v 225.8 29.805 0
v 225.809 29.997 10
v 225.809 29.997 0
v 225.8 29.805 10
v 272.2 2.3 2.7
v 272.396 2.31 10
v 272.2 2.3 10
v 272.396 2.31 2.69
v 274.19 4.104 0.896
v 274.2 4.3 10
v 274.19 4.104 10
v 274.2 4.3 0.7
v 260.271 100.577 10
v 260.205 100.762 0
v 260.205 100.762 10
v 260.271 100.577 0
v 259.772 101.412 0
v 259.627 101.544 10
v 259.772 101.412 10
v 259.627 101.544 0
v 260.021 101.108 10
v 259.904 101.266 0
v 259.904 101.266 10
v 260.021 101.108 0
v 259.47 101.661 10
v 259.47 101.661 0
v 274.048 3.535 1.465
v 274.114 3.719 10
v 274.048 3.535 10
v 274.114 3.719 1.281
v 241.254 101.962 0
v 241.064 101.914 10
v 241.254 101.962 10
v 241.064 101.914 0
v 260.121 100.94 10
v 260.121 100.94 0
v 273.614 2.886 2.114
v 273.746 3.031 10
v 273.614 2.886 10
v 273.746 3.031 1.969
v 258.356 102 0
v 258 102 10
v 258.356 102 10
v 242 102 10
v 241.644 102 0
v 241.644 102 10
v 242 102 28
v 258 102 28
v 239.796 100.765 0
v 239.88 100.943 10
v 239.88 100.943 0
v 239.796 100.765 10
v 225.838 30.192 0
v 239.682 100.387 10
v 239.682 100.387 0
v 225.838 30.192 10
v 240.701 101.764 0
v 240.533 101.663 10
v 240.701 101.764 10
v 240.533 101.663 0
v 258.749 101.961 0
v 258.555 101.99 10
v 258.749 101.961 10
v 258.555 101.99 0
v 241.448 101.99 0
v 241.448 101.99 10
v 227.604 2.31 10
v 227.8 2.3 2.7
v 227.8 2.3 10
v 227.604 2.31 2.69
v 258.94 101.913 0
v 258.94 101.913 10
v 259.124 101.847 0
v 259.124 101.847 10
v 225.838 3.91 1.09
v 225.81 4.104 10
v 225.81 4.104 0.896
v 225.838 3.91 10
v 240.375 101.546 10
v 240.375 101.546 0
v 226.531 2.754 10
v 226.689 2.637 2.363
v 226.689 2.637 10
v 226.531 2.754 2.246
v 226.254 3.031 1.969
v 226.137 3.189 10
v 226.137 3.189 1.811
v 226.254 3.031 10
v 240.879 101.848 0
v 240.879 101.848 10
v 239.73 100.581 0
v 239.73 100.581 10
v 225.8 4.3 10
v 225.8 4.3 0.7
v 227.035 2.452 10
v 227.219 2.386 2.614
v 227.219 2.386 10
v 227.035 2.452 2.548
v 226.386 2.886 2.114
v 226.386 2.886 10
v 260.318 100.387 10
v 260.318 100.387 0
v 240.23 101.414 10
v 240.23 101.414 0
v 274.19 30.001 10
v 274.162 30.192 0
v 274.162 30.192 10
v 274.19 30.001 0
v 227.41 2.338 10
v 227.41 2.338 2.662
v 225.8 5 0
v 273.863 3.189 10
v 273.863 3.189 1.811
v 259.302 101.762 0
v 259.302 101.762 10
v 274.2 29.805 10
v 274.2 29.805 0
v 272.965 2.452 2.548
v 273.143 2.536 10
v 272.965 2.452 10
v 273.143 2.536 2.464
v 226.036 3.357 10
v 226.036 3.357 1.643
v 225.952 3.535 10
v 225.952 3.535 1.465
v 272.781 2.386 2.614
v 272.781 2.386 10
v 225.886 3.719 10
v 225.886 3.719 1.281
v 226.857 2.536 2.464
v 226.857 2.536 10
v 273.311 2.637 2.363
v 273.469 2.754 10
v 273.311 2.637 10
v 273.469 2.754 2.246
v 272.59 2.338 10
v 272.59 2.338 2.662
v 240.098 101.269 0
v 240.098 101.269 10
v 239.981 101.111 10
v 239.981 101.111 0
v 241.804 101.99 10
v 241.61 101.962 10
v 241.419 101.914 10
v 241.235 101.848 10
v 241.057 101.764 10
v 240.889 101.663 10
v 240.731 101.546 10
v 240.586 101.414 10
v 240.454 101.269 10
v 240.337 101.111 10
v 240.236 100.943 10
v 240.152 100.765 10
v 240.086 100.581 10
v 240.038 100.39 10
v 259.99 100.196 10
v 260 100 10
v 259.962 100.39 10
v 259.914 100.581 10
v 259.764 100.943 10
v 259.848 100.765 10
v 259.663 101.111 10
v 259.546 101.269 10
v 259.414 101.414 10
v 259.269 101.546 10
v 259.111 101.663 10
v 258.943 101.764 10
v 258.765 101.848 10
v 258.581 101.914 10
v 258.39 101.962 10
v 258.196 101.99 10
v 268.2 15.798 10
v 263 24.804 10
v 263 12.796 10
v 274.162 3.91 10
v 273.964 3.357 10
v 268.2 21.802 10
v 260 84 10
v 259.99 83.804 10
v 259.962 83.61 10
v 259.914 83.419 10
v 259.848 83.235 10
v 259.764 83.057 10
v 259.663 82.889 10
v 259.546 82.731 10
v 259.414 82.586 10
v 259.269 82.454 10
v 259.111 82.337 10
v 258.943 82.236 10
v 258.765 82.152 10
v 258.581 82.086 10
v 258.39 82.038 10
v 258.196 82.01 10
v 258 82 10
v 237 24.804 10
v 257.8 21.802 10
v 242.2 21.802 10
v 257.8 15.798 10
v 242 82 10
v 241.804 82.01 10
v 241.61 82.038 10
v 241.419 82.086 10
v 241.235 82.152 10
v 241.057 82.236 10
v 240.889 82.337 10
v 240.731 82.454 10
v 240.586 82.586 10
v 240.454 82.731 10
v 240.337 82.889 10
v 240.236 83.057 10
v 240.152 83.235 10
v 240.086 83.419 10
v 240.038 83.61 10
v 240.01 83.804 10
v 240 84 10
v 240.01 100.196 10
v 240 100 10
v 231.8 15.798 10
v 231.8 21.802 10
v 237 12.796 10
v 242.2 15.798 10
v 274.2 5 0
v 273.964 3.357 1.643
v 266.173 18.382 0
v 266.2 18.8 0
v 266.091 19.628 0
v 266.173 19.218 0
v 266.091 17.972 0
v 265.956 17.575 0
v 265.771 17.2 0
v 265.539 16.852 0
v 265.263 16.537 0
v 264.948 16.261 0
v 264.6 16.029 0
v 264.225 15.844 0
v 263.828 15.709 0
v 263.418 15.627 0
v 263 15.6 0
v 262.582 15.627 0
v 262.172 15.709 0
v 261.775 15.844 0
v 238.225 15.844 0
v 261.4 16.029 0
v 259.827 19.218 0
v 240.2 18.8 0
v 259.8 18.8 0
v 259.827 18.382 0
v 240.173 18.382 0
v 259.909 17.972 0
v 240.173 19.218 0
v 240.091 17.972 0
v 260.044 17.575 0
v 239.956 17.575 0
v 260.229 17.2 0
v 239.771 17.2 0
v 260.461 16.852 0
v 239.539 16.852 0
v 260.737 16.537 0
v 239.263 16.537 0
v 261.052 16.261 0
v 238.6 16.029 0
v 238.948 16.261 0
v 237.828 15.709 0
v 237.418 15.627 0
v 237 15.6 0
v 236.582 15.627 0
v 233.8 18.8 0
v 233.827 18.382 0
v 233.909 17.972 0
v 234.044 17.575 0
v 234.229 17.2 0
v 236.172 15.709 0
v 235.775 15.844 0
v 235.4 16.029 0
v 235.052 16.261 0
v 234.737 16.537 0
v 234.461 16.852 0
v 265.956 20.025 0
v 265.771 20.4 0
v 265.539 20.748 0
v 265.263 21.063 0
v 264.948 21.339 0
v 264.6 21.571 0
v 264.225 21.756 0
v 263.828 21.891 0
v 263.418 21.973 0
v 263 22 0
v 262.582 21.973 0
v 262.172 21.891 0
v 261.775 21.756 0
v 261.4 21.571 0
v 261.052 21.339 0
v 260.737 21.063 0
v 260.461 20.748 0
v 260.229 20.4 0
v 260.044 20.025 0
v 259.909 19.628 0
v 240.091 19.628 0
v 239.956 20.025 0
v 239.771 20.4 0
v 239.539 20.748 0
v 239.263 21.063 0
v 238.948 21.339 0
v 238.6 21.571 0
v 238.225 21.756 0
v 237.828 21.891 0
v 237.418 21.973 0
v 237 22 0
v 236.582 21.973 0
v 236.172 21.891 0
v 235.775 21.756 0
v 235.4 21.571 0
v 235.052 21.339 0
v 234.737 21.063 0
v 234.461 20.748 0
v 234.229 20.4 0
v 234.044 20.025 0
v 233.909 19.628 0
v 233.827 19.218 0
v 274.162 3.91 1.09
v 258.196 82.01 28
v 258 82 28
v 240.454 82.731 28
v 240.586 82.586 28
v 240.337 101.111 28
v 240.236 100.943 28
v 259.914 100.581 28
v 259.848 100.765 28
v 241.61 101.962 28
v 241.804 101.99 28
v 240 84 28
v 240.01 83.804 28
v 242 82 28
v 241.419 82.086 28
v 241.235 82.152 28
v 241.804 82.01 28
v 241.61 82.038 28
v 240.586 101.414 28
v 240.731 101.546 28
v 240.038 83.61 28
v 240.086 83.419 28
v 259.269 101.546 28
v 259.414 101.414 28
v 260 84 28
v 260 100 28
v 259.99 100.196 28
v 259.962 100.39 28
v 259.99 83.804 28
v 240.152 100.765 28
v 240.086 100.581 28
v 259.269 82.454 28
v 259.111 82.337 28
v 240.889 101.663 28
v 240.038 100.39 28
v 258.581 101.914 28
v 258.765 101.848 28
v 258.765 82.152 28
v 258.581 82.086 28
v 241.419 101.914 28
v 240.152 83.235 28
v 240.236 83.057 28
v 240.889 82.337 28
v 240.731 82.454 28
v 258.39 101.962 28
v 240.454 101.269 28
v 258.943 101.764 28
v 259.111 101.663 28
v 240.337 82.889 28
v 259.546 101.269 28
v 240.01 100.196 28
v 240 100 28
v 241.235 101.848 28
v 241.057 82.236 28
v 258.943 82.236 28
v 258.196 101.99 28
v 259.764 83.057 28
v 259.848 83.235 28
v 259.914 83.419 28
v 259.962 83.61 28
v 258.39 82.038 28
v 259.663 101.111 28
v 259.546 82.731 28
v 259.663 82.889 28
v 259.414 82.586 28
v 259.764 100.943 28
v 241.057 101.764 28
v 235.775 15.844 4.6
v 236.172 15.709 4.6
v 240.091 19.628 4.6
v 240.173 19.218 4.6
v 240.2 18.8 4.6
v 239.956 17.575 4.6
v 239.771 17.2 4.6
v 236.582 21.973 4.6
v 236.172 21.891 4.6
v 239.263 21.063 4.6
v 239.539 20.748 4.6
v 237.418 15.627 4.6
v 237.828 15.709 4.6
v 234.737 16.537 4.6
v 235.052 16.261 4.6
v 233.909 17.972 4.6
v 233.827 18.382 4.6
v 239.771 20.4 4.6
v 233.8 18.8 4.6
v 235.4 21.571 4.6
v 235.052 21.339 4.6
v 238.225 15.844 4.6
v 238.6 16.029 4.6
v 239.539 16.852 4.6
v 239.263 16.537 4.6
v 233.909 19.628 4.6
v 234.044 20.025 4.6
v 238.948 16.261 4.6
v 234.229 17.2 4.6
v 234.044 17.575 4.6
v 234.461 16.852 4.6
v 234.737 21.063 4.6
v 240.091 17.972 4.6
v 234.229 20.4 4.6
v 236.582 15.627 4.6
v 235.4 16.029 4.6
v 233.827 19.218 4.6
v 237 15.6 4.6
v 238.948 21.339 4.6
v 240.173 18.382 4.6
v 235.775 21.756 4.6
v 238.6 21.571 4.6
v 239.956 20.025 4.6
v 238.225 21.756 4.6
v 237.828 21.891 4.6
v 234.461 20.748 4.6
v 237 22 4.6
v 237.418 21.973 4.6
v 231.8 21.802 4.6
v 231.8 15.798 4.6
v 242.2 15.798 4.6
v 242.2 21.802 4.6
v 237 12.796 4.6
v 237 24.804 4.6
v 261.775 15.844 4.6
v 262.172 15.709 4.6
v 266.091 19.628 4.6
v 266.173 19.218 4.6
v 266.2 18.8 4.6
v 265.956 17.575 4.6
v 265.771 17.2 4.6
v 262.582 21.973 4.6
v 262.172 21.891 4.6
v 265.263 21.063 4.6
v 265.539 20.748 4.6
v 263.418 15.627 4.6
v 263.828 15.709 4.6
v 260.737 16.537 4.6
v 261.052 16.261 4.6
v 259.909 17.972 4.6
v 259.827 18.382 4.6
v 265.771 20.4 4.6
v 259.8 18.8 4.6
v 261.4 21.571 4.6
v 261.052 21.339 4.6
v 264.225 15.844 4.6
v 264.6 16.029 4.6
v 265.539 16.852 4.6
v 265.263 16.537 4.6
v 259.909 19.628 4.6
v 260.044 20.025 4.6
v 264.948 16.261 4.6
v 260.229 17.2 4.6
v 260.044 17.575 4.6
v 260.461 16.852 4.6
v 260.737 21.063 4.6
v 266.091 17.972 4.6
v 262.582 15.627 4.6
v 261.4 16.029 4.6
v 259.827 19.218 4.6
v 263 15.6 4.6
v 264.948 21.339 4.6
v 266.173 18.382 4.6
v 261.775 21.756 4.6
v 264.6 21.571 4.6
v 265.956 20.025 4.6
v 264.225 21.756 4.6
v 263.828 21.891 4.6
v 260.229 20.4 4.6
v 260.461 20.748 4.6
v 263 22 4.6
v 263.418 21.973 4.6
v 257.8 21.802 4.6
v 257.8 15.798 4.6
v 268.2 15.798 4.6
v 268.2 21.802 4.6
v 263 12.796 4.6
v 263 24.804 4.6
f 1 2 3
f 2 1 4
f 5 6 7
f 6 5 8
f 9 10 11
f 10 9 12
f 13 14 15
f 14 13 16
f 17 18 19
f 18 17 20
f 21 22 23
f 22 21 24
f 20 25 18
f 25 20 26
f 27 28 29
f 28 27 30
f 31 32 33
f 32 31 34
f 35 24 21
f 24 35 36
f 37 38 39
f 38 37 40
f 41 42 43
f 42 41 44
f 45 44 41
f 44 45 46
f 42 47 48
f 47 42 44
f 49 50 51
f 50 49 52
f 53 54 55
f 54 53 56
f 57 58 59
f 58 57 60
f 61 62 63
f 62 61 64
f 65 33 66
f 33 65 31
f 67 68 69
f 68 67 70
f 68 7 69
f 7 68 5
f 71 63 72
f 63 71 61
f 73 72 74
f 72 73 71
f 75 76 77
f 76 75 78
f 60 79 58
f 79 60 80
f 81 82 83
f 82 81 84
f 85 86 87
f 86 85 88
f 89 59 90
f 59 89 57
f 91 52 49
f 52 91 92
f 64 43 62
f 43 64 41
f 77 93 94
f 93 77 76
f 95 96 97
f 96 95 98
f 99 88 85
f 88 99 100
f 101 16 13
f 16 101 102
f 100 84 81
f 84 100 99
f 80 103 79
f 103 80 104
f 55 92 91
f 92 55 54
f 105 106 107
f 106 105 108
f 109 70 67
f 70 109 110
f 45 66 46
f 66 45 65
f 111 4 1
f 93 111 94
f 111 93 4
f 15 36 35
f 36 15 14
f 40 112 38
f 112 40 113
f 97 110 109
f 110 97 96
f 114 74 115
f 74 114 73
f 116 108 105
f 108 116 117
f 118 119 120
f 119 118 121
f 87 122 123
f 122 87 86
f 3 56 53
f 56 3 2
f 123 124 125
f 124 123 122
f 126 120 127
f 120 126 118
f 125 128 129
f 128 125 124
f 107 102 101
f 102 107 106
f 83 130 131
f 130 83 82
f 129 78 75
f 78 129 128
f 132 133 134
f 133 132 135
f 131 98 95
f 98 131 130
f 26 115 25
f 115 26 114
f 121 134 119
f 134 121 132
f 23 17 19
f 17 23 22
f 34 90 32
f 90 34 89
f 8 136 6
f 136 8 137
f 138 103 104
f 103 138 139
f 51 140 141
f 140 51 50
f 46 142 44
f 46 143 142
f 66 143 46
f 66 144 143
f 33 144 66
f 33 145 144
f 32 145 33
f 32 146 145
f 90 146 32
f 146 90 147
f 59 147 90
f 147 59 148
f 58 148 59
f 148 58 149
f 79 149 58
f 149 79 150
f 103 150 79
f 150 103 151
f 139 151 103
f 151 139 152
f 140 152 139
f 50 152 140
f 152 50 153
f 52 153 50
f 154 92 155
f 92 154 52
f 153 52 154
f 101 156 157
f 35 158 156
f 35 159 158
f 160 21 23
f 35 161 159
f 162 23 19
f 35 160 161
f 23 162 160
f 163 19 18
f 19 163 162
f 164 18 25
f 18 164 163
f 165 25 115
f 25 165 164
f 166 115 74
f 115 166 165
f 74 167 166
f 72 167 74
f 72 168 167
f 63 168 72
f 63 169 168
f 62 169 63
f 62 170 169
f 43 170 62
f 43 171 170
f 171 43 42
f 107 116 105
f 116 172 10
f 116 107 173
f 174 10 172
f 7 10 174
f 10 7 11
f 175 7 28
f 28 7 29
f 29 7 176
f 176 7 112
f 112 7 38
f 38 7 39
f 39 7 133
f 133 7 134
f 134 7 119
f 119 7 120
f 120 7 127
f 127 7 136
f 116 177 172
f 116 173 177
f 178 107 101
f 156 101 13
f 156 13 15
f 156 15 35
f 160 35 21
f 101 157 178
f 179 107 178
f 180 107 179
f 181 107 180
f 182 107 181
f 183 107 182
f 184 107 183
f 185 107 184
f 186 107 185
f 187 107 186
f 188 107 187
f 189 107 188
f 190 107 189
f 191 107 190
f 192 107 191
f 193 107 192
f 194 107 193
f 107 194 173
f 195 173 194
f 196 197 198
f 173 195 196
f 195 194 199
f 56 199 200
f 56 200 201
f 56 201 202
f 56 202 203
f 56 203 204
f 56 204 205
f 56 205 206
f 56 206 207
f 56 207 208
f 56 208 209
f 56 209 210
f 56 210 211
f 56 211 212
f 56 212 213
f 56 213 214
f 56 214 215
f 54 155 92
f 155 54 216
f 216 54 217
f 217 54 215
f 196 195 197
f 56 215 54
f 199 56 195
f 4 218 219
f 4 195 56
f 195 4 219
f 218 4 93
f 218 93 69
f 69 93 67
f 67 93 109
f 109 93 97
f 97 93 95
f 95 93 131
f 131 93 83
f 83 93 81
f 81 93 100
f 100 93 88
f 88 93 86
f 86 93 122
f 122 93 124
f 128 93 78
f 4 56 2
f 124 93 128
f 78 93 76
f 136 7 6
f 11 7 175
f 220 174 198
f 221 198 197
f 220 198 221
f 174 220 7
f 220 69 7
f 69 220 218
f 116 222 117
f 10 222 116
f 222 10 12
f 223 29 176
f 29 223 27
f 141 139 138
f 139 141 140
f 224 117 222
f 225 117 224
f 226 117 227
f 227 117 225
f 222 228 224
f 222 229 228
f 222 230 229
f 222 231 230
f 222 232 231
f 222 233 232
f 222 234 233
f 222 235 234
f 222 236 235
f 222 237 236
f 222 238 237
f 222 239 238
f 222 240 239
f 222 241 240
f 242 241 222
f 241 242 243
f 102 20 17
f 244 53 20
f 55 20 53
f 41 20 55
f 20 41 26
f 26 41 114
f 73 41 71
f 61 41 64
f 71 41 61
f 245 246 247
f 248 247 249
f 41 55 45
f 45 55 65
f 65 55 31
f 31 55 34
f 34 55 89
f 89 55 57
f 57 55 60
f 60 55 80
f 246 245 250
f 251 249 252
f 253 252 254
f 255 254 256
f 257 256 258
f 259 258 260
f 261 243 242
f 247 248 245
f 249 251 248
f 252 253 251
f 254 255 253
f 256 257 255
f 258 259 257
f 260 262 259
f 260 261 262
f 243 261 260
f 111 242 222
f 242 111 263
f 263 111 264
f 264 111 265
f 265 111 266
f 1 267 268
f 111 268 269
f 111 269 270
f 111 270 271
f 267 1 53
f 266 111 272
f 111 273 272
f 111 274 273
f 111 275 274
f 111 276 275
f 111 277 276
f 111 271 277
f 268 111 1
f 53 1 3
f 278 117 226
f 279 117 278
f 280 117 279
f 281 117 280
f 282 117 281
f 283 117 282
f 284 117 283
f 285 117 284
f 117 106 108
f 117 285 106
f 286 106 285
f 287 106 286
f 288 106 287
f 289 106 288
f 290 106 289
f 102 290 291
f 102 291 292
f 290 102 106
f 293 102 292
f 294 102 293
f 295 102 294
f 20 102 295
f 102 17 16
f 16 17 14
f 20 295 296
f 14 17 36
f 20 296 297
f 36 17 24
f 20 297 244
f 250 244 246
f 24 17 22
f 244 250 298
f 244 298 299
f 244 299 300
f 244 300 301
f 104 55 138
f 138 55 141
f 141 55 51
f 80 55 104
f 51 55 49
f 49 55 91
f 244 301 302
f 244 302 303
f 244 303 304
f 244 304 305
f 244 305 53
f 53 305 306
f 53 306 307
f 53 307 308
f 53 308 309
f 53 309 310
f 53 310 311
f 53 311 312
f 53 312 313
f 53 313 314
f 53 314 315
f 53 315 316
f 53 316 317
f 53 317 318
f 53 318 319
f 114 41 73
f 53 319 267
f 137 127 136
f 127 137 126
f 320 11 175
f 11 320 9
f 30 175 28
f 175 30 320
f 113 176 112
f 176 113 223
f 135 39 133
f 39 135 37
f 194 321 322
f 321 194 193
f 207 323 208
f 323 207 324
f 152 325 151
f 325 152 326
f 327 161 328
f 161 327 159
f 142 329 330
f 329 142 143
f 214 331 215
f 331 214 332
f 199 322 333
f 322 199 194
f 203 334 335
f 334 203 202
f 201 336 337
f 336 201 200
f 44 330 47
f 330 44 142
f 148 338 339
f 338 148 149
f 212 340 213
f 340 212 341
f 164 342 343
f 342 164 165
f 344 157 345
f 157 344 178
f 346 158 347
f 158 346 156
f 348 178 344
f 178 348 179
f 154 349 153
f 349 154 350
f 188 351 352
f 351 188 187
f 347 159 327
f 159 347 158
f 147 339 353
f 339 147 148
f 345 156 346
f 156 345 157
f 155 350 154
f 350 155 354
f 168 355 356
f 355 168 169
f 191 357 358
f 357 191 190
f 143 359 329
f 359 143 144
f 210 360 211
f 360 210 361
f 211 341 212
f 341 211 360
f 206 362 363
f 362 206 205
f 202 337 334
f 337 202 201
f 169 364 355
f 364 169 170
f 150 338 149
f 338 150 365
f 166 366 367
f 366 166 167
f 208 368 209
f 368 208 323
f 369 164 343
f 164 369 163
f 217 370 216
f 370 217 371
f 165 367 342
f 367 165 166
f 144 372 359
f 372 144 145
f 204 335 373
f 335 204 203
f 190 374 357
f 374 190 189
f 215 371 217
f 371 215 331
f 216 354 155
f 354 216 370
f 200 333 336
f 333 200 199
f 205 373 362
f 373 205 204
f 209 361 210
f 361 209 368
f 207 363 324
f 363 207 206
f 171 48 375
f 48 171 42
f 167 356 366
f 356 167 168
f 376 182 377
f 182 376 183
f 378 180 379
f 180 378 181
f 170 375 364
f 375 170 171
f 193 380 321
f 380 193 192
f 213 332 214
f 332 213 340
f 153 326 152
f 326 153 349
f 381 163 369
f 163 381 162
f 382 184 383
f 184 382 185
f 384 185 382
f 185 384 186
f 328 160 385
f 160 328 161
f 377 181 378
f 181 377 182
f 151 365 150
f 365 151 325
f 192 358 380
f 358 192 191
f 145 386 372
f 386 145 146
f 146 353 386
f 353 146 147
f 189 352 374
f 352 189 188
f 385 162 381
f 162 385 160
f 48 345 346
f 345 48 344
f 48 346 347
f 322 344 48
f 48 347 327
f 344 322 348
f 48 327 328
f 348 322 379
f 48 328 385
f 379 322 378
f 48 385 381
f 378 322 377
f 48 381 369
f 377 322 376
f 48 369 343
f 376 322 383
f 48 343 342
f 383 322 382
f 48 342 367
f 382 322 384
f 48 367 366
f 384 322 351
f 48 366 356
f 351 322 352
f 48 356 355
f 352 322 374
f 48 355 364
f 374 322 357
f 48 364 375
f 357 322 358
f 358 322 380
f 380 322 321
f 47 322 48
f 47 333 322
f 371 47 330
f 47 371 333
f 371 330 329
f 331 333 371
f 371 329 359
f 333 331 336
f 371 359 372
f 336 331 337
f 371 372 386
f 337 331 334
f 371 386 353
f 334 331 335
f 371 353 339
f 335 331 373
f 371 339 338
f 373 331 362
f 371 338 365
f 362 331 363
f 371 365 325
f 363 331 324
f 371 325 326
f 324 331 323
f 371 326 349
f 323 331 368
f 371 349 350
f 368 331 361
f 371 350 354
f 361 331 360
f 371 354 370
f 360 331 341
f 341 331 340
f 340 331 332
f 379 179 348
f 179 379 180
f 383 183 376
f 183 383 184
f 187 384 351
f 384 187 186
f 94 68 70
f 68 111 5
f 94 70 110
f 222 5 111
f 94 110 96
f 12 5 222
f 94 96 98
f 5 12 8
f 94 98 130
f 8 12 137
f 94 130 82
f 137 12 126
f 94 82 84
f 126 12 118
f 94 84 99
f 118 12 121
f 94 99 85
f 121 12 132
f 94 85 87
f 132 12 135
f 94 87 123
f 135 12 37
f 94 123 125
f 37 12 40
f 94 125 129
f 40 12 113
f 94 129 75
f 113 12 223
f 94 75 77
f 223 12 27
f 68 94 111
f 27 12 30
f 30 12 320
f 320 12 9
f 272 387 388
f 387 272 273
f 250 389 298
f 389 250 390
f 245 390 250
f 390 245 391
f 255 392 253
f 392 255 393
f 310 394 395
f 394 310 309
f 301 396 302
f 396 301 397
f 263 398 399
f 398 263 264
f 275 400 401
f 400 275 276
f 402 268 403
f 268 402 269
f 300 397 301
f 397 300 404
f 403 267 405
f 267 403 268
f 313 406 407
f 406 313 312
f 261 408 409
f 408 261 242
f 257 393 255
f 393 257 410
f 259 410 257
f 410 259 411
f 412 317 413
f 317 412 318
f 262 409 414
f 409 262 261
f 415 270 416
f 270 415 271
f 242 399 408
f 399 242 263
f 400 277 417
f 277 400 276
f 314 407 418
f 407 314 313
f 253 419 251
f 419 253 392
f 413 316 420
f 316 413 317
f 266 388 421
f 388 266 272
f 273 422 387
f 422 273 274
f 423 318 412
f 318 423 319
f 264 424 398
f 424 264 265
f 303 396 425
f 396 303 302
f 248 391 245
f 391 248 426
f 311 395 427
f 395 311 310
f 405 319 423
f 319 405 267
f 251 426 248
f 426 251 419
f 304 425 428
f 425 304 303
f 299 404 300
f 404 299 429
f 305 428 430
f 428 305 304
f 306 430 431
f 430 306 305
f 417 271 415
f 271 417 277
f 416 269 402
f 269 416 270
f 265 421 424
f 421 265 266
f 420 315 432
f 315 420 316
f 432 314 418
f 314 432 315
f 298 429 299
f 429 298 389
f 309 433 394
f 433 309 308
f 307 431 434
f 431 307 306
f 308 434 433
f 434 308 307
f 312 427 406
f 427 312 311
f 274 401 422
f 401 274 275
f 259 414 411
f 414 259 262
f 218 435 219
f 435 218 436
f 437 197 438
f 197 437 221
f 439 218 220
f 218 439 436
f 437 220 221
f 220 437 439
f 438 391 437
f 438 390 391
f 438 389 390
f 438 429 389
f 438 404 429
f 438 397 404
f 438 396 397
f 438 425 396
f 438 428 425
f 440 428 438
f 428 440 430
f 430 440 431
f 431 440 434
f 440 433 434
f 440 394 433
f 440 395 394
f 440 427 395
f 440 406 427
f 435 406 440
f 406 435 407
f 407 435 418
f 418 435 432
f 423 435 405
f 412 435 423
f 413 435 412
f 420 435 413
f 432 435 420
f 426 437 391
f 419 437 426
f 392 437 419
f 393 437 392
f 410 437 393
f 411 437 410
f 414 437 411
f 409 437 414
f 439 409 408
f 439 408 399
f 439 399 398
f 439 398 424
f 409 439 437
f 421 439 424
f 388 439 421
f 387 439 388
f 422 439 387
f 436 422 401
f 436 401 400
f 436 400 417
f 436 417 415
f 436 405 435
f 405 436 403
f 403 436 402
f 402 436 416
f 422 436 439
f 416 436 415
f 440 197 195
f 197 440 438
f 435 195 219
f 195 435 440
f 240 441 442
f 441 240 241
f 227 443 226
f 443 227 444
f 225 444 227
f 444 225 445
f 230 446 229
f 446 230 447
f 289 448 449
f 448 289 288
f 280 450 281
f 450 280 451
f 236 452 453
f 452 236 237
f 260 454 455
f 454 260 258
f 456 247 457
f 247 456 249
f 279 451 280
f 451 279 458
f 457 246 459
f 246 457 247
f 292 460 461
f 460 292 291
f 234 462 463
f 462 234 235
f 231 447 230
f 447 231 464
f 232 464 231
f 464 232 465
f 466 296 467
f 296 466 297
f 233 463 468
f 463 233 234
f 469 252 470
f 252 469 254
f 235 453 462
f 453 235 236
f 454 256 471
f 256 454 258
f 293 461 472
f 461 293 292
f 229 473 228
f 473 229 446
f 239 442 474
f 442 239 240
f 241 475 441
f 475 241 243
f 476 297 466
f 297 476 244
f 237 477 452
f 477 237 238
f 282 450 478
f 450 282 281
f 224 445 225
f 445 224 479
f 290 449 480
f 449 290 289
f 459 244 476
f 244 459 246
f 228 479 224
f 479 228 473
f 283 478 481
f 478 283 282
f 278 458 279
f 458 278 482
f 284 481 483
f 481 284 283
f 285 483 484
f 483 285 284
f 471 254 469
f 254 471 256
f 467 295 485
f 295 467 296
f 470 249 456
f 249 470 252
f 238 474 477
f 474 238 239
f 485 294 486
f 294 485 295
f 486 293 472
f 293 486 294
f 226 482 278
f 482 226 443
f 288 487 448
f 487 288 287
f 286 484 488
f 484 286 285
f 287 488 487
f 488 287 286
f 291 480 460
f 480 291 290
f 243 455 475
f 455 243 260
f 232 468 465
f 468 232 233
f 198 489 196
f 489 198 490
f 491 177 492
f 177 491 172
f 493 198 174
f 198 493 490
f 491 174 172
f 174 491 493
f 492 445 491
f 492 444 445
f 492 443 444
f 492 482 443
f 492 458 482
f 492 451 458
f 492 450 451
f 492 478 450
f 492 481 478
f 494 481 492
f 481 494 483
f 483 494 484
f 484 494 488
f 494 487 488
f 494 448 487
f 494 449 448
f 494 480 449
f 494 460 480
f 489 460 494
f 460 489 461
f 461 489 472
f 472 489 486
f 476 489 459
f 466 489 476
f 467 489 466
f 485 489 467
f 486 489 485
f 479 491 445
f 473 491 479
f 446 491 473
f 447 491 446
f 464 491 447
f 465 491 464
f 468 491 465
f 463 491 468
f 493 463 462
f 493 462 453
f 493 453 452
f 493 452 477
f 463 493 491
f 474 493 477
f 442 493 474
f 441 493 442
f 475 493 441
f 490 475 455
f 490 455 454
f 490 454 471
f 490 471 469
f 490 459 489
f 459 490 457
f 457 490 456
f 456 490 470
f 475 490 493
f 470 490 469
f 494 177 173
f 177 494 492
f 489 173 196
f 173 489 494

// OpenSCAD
// file: ../../../../modules/steel_rack.scad
use <bolts.scad>;

bolt_edge_offset = 15;
bolt_positions = [
  bolt_edge_offset,
  bolt_edge_offset + 98,
  bolt_edge_offset + 98 + 24,
];

module bolt_and_nut(y, h) {
  nut_thickness = 5;
  translate([0, y, h / 2])
    m6_bolt_hole(h + 1, center = true);
  translate([0, y, h - nut_thickness / 2])
    rotate([0, 0, 90])
    m6_nut_trap(nut_thickness, center = true);
}

module long_bar(w, y, h) {
  difference() {
    translate([w / 2, y / 2, h / 2])
      cube([w, y, h], center = true);

    for (x = bolt_positions) {
      translate([x, 0, 0])
        bolt_and_nut(y / 2, h);
    }
  }
}

module short_bar(w, y, h) {
  difference() {
    translate([w / 2, y / 2, h / 2])
      cube([w, y, h], center = true);

    translate([bolt_positions[0], 0, 0])
      bolt_and_nut(y / 2, h);
  }
}

module fillet_profile(r, h) {
  linear_extrude(height = h, center = true)
    difference() {
      square([r, r]);
      circle(r = r, $fn = 64);
    }
}
// file: ../../../../modules/slide_rail_outer_bracket.scad
use <bolts.scad>
use <steel_rack.scad>

// スライドレール外側とL字アングルを接合するL字ブラケット。
// 設計の経緯と確定値は ledger/designs/steel-rack-500x400.md が正本。
//
// 座標系 (部品自身の datum):
//   X = 0 がこの部品側のL字アングル外側面。部品はアングル板厚の内側から始まる
//   Y = 0 がスライドレール外側面。+Y がラック外側
//   Z = 0 が部品底面 (レール下端と一致)
// front は screw_x = [37, 101.5]、rear は [79.5, 176] を自分の datum
// から渡す。 M6 が高さ 22.5±12 の対称配置のため部品は Z 反転対称になり、
// 左右のレールにも上下反転するだけで同じ2部品を使い回せる。

bracket_height = 45;
flange_t = 10; // 短辺 (X方向厚) の厚さ
// 長辺 (Y方向厚) の厚さ。旧断面は flange_t=10 を共用していたが、レール面を
// rail_offset 分外へ出すと M6 ナット挿入口が長辺と重なるため 2mm 削った
// (10→8、user決定)。ナット六角の内縁 (y=8.000) と長辺外面がツライチになる
arm_t = 8;
// レール接触面のラック外側オフセット。組付け実測でレール間隔が 385mm しか
// なくケース 412mm が入らないため、(412 - 385) / 2 + 0.5 = 14mm ずつ
// 各レールを外側へ移す (user指示)。M6 実穴は既に開いており位置を変えられない
rail_offset = 14;
inner_r = 4;
m6_z = [ 10.5, 34.5 ];
// クリアランス基準: 呼び寸法 + 0.4mm (実プリントの嵌合結果から拡大)
m6_pass_flat = 6.4; // M6ボルト通し六角の二面幅 (手前5mm)
m6_nut_flat = 10.4; // M6ナット窪み六角の二面幅 (奥5mm、ナット実測9.8 + 実効0.6)
m6_stage_depth = 5;
screw_z = 22.5;
m4_pass_flat = 4.4; // M4小トラスネジ通し六角の二面幅
m4_nut_flat = 7.4; // M4ナット窪み六角の二面幅 (ナット実測6.8 + 実効0.6)
m4_nut_depth = 2.8; // M4ナット窪みの深さ (user指定)
edge_margin = 8; // 穴の外縁から部品端までの余白 (自由な辺のみ)
angle_t = 2.2; // L字アングルの板厚

// 六角プリズム: 軸X・上下の辺が水平 (flat-up)。
// 天井を短い水平ブリッジにして垂れの改善を狙う
// (point-up だと天井面が水平から30°になり垂れた — 嵌合試験で確認済み)
module
hex_x_flat_up(flat_d, l)
{
    rotate([ 0, 90, 0 ]) rotate([ 0, 0, 90 ]) hex_hole(flat_d = flat_d, h = l);
}

// 六角プリズム: 軸Y・上下の辺が水平 (flat-up)。M6と同じくブリッジ天井
module
hex_y_flat_up(flat_d, l)
{
    rotate([ 90, 0, 0 ]) hex_hole(flat_d = flat_d, h = l);
}

module
slide_rail_outer_bracket(screw_x, name = "bracket")
{
    // flat-up配置では水平方向の穴半径は対角/2 (= 二面幅/(2*cos30))。
    // 8mm余白の契約はこの実半径に対して守る
    m6_nut_diag = m6_nut_flat / cos(30);
    m4_nut_diag = m4_nut_flat / cos(30);
    // M6中心: 実物のアングルには旧断面 (長辺厚10) の導出値
    // (厚10 + 内側R + 余白 + M6六角対角/2 = 28.0044) で既に穴が開いている。
    // 旧導出式から rail_offset を引くことで M6 実穴と部品外端の絶対位置を
    // 保ったまま、レール接触面 (y=0) だけをラック外側へ 14mm 出す
    m6_y = flange_t + inner_r + edge_margin + m6_nut_diag / 2 - rail_offset;
    short_len = m6_y + m6_nut_diag / 2 + edge_margin;
    // 長辺のX終端: 最奥のM4穴の最大断面 (ナット窪みの対角の半分) + 余白
    arm_end = max(screw_x) + m4_nut_diag / 2 + edge_margin;

    echo(str("CONTRACT ", name, ": height = ", bracket_height));
    echo(str("CONTRACT ", name, ": flange_t = ", flange_t));
    echo(str("CONTRACT ", name, ": arm_t = ", arm_t));
    echo(str("CONTRACT ", name, ": rail_offset = ", rail_offset));
    echo(str("CONTRACT ", name, ": inner_r = ", inner_r));
    echo(str("CONTRACT ", name, ": m6_z = ", m6_z));
    echo(str("CONTRACT ", name, ": m6_pass_flat = ", m6_pass_flat));
    echo(str("CONTRACT ", name, ": m6_nut_flat = ", m6_nut_flat));
    echo(str("CONTRACT ", name, ": screw_z = ", screw_z));
    echo(str("CONTRACT ", name, ": m4_pass_flat = ", m4_pass_flat));
    echo(str("CONTRACT ", name, ": m4_nut_flat = ", m4_nut_flat));
    echo(str("CONTRACT ", name, ": m4_nut_depth = ", m4_nut_depth));
    echo(str("CONTRACT ", name, ": edge_margin = ", edge_margin));
    echo(str("CONTRACT ", name, ": angle_t = ", angle_t));
    echo(str("CONTRACT ", name, ": screw_x = ", screw_x));
    echo(str("CONTRACT ",
             name,
             ": m6_y = ",
             m6_y,
             ", short_len = ",
             short_len,
             ", arm_end = ",
             arm_end));

    // 余白の契約 (自由な辺のみ。高さ45とM6のZはuser固定値なので対象外)。
    // M6ナット六角の内縁 (m6_y - 対角/2 = 8.000) は長辺外面 (y = arm_t) と
    // ツライチで、ナット挿入口が長辺に塞がれない (1e-9 は浮動小数の丸め猶予)
    assert(m6_y - m6_nut_diag / 2 >= arm_t - 1e-9,
           "M6 nut slot is blocked by the arm");
    assert(short_len - (m6_y + m6_nut_diag / 2) >= edge_margin,
           "M6 hole too close to the short-flange edge");
    assert(arm_end - (max(screw_x) + m4_nut_diag / 2) >= edge_margin,
           "M4 hole too close to the arm end");
    assert(min(screw_x) - m4_nut_diag / 2 >= angle_t + flange_t,
           "M4 hole overlaps the short flange");

    difference()
    {
        union()
        {
            // 短辺: アングル内側に当たる縦板 (M6で締結)
            translate([ angle_t, 0, 0 ])
                cube([ flange_t, short_len, bracket_height ]);

            // 長辺: レール外側面に当たる横板 (M4小トラスネジ+ナットで締結)
            translate([ angle_t, 0, 0 ])
                cube([ arm_end - angle_t, arm_t, bracket_height ]);

            // 内側コーナーのR4フィレット (応力集中の回避)
            translate([
                angle_t + flange_t + inner_r,
                arm_t + inner_r,
                bracket_height / 2
            ]) rotate([ 0, 0, 180 ]) fillet_profile(inner_r, bracket_height);
        }

        // M6の2段六角穴 (軸X・flat-up): 手前5mmが通し、奥5mmがナット窪み。
        // ナット窪みは +X へ延長した挿入回廊 (x=7.2..17): 短辺の背面から
        // fillet の掛かる区間を局所カットし、fillet 外端 (x=16.2) を 0.8mm
        // 超えて開放することで M6 ナットを +X 側から真っ直ぐ挿入できる
        // (fillet と挿入経路の干渉分を削るのは user 許容)。
        // 六角の下頂点 (y=8.000) は長辺外面とツライチで、正確な接触は
        // 退化した稜 (非多様体STL) を作るため、hull で 0.2mm 下へ掃引して
        // 長辺外面に浅い逃げ溝を彫る (ナットの嵌合には影響しない)
        slot_start = angle_t + flange_t - m6_stage_depth;
        slot_end = angle_t + flange_t + inner_r + 0.8;
        slot_relief = 0.2;
        for (z = m6_z) {
            translate([ angle_t + m6_stage_depth / 2 - 0.05, m6_y, z ])
                hex_x_flat_up(m6_pass_flat, m6_stage_depth + 0.1);
            translate([ (slot_start + slot_end) / 2, m6_y, z ]) hull()
            {
                hex_x_flat_up(m6_nut_flat, slot_end - slot_start);
                translate([ 0, -slot_relief, 0 ])
                    hex_x_flat_up(m6_nut_flat, slot_end - slot_start);
            }
        }

        // M4小トラスネジの穴 (軸Y・flat-up):
        // 通しは全厚を貫通し、L字の内側面 (y=8) から深さ2.8mmのナット窪み。
        // ネジはレール内側から刺さり
        // (トラス頭はスライダーと干渉しない実測済み)、
        // ナットが窪みの底で受けてレール板とブラケットを共締めする
        for (x = screw_x) {
            translate([ x, arm_t / 2, screw_z ])
                hex_y_flat_up(m4_pass_flat, arm_t + 0.2);
            translate([ x, arm_t - m4_nut_depth / 2 + 0.05, screw_z ])
                hex_y_flat_up(m4_nut_flat, m4_nut_depth + 0.1);
        }
    }
}
// file: ../../../../modules/bolts.scad
module nut_trap(d, h, center = true) {
  linear_extrude(height = h, center = center)
  circle(d = d / cos(30), $fn = 6);
}

module bolt_hole(d, h, center = true) {
  linear_extrude(height = h, center = center)
  circle(d = d, $fn = 64);
}

// Hex holes for self-tapping (nominal - 0.2mm)
module hex_hole(flat_d, h) {
  linear_extrude(height = h, center = true)
  circle(d = flat_d / cos(30), $fn = 6);
}

module m3_bolt_hexhole(h) {
  rotate([0, 0, 90]) hex_hole(flat_d = 2.8, h = h);
}

module m4_bolt_hexhole(h) {
  rotate([0, 0, 90]) hex_hole(flat_d = 3.8, h = h);
}

module m6_bolt_hexhole(h) {
  rotate([0, 0, 90]) hex_hole(flat_d = 5.8, h = h);
}

module m8_bolt_hexhole(h) {
  rotate([0, 0, 90]) hex_hole(flat_d = 7.8, h = h);
}

// M3
module m3_bolt_hole(h, center = false) { bolt_hole(d = 3.4, h = h, center = center); }
module m3_nut_trap(h, center = false) { nut_trap(d = 5.7, h = h, center = center); }

// M4
module m4_bolt_hole(h, center = false) { bolt_hole(d = 4.4, h = h, center = center); }
module m4_nut_trap(h, center = false) { nut_trap(d = 7.5, h = h, center = center); }

// M6
module m6_bolt_hole(h, center = false) { bolt_hole(d = 6.2, h = h, center = center); }
module m6_nut_trap(h, center = false) { nut_trap(d = 10.2, h = h, center = center); }

// M8
module m8_bolt_hole(h, center = false) { bolt_hole(d = 8.4, h = h, center = center); }
module m8_nut_trap(h, center = false) { nut_trap(d = 13.3, h = h, center = center); }
// main file
use <../../../../modules/shelf_frame.scad>

// ケース棚の辺の支え。手前・奥の30cm材の中央用。
shelf_frame_flat_print() shelf_frame_mid_front();
